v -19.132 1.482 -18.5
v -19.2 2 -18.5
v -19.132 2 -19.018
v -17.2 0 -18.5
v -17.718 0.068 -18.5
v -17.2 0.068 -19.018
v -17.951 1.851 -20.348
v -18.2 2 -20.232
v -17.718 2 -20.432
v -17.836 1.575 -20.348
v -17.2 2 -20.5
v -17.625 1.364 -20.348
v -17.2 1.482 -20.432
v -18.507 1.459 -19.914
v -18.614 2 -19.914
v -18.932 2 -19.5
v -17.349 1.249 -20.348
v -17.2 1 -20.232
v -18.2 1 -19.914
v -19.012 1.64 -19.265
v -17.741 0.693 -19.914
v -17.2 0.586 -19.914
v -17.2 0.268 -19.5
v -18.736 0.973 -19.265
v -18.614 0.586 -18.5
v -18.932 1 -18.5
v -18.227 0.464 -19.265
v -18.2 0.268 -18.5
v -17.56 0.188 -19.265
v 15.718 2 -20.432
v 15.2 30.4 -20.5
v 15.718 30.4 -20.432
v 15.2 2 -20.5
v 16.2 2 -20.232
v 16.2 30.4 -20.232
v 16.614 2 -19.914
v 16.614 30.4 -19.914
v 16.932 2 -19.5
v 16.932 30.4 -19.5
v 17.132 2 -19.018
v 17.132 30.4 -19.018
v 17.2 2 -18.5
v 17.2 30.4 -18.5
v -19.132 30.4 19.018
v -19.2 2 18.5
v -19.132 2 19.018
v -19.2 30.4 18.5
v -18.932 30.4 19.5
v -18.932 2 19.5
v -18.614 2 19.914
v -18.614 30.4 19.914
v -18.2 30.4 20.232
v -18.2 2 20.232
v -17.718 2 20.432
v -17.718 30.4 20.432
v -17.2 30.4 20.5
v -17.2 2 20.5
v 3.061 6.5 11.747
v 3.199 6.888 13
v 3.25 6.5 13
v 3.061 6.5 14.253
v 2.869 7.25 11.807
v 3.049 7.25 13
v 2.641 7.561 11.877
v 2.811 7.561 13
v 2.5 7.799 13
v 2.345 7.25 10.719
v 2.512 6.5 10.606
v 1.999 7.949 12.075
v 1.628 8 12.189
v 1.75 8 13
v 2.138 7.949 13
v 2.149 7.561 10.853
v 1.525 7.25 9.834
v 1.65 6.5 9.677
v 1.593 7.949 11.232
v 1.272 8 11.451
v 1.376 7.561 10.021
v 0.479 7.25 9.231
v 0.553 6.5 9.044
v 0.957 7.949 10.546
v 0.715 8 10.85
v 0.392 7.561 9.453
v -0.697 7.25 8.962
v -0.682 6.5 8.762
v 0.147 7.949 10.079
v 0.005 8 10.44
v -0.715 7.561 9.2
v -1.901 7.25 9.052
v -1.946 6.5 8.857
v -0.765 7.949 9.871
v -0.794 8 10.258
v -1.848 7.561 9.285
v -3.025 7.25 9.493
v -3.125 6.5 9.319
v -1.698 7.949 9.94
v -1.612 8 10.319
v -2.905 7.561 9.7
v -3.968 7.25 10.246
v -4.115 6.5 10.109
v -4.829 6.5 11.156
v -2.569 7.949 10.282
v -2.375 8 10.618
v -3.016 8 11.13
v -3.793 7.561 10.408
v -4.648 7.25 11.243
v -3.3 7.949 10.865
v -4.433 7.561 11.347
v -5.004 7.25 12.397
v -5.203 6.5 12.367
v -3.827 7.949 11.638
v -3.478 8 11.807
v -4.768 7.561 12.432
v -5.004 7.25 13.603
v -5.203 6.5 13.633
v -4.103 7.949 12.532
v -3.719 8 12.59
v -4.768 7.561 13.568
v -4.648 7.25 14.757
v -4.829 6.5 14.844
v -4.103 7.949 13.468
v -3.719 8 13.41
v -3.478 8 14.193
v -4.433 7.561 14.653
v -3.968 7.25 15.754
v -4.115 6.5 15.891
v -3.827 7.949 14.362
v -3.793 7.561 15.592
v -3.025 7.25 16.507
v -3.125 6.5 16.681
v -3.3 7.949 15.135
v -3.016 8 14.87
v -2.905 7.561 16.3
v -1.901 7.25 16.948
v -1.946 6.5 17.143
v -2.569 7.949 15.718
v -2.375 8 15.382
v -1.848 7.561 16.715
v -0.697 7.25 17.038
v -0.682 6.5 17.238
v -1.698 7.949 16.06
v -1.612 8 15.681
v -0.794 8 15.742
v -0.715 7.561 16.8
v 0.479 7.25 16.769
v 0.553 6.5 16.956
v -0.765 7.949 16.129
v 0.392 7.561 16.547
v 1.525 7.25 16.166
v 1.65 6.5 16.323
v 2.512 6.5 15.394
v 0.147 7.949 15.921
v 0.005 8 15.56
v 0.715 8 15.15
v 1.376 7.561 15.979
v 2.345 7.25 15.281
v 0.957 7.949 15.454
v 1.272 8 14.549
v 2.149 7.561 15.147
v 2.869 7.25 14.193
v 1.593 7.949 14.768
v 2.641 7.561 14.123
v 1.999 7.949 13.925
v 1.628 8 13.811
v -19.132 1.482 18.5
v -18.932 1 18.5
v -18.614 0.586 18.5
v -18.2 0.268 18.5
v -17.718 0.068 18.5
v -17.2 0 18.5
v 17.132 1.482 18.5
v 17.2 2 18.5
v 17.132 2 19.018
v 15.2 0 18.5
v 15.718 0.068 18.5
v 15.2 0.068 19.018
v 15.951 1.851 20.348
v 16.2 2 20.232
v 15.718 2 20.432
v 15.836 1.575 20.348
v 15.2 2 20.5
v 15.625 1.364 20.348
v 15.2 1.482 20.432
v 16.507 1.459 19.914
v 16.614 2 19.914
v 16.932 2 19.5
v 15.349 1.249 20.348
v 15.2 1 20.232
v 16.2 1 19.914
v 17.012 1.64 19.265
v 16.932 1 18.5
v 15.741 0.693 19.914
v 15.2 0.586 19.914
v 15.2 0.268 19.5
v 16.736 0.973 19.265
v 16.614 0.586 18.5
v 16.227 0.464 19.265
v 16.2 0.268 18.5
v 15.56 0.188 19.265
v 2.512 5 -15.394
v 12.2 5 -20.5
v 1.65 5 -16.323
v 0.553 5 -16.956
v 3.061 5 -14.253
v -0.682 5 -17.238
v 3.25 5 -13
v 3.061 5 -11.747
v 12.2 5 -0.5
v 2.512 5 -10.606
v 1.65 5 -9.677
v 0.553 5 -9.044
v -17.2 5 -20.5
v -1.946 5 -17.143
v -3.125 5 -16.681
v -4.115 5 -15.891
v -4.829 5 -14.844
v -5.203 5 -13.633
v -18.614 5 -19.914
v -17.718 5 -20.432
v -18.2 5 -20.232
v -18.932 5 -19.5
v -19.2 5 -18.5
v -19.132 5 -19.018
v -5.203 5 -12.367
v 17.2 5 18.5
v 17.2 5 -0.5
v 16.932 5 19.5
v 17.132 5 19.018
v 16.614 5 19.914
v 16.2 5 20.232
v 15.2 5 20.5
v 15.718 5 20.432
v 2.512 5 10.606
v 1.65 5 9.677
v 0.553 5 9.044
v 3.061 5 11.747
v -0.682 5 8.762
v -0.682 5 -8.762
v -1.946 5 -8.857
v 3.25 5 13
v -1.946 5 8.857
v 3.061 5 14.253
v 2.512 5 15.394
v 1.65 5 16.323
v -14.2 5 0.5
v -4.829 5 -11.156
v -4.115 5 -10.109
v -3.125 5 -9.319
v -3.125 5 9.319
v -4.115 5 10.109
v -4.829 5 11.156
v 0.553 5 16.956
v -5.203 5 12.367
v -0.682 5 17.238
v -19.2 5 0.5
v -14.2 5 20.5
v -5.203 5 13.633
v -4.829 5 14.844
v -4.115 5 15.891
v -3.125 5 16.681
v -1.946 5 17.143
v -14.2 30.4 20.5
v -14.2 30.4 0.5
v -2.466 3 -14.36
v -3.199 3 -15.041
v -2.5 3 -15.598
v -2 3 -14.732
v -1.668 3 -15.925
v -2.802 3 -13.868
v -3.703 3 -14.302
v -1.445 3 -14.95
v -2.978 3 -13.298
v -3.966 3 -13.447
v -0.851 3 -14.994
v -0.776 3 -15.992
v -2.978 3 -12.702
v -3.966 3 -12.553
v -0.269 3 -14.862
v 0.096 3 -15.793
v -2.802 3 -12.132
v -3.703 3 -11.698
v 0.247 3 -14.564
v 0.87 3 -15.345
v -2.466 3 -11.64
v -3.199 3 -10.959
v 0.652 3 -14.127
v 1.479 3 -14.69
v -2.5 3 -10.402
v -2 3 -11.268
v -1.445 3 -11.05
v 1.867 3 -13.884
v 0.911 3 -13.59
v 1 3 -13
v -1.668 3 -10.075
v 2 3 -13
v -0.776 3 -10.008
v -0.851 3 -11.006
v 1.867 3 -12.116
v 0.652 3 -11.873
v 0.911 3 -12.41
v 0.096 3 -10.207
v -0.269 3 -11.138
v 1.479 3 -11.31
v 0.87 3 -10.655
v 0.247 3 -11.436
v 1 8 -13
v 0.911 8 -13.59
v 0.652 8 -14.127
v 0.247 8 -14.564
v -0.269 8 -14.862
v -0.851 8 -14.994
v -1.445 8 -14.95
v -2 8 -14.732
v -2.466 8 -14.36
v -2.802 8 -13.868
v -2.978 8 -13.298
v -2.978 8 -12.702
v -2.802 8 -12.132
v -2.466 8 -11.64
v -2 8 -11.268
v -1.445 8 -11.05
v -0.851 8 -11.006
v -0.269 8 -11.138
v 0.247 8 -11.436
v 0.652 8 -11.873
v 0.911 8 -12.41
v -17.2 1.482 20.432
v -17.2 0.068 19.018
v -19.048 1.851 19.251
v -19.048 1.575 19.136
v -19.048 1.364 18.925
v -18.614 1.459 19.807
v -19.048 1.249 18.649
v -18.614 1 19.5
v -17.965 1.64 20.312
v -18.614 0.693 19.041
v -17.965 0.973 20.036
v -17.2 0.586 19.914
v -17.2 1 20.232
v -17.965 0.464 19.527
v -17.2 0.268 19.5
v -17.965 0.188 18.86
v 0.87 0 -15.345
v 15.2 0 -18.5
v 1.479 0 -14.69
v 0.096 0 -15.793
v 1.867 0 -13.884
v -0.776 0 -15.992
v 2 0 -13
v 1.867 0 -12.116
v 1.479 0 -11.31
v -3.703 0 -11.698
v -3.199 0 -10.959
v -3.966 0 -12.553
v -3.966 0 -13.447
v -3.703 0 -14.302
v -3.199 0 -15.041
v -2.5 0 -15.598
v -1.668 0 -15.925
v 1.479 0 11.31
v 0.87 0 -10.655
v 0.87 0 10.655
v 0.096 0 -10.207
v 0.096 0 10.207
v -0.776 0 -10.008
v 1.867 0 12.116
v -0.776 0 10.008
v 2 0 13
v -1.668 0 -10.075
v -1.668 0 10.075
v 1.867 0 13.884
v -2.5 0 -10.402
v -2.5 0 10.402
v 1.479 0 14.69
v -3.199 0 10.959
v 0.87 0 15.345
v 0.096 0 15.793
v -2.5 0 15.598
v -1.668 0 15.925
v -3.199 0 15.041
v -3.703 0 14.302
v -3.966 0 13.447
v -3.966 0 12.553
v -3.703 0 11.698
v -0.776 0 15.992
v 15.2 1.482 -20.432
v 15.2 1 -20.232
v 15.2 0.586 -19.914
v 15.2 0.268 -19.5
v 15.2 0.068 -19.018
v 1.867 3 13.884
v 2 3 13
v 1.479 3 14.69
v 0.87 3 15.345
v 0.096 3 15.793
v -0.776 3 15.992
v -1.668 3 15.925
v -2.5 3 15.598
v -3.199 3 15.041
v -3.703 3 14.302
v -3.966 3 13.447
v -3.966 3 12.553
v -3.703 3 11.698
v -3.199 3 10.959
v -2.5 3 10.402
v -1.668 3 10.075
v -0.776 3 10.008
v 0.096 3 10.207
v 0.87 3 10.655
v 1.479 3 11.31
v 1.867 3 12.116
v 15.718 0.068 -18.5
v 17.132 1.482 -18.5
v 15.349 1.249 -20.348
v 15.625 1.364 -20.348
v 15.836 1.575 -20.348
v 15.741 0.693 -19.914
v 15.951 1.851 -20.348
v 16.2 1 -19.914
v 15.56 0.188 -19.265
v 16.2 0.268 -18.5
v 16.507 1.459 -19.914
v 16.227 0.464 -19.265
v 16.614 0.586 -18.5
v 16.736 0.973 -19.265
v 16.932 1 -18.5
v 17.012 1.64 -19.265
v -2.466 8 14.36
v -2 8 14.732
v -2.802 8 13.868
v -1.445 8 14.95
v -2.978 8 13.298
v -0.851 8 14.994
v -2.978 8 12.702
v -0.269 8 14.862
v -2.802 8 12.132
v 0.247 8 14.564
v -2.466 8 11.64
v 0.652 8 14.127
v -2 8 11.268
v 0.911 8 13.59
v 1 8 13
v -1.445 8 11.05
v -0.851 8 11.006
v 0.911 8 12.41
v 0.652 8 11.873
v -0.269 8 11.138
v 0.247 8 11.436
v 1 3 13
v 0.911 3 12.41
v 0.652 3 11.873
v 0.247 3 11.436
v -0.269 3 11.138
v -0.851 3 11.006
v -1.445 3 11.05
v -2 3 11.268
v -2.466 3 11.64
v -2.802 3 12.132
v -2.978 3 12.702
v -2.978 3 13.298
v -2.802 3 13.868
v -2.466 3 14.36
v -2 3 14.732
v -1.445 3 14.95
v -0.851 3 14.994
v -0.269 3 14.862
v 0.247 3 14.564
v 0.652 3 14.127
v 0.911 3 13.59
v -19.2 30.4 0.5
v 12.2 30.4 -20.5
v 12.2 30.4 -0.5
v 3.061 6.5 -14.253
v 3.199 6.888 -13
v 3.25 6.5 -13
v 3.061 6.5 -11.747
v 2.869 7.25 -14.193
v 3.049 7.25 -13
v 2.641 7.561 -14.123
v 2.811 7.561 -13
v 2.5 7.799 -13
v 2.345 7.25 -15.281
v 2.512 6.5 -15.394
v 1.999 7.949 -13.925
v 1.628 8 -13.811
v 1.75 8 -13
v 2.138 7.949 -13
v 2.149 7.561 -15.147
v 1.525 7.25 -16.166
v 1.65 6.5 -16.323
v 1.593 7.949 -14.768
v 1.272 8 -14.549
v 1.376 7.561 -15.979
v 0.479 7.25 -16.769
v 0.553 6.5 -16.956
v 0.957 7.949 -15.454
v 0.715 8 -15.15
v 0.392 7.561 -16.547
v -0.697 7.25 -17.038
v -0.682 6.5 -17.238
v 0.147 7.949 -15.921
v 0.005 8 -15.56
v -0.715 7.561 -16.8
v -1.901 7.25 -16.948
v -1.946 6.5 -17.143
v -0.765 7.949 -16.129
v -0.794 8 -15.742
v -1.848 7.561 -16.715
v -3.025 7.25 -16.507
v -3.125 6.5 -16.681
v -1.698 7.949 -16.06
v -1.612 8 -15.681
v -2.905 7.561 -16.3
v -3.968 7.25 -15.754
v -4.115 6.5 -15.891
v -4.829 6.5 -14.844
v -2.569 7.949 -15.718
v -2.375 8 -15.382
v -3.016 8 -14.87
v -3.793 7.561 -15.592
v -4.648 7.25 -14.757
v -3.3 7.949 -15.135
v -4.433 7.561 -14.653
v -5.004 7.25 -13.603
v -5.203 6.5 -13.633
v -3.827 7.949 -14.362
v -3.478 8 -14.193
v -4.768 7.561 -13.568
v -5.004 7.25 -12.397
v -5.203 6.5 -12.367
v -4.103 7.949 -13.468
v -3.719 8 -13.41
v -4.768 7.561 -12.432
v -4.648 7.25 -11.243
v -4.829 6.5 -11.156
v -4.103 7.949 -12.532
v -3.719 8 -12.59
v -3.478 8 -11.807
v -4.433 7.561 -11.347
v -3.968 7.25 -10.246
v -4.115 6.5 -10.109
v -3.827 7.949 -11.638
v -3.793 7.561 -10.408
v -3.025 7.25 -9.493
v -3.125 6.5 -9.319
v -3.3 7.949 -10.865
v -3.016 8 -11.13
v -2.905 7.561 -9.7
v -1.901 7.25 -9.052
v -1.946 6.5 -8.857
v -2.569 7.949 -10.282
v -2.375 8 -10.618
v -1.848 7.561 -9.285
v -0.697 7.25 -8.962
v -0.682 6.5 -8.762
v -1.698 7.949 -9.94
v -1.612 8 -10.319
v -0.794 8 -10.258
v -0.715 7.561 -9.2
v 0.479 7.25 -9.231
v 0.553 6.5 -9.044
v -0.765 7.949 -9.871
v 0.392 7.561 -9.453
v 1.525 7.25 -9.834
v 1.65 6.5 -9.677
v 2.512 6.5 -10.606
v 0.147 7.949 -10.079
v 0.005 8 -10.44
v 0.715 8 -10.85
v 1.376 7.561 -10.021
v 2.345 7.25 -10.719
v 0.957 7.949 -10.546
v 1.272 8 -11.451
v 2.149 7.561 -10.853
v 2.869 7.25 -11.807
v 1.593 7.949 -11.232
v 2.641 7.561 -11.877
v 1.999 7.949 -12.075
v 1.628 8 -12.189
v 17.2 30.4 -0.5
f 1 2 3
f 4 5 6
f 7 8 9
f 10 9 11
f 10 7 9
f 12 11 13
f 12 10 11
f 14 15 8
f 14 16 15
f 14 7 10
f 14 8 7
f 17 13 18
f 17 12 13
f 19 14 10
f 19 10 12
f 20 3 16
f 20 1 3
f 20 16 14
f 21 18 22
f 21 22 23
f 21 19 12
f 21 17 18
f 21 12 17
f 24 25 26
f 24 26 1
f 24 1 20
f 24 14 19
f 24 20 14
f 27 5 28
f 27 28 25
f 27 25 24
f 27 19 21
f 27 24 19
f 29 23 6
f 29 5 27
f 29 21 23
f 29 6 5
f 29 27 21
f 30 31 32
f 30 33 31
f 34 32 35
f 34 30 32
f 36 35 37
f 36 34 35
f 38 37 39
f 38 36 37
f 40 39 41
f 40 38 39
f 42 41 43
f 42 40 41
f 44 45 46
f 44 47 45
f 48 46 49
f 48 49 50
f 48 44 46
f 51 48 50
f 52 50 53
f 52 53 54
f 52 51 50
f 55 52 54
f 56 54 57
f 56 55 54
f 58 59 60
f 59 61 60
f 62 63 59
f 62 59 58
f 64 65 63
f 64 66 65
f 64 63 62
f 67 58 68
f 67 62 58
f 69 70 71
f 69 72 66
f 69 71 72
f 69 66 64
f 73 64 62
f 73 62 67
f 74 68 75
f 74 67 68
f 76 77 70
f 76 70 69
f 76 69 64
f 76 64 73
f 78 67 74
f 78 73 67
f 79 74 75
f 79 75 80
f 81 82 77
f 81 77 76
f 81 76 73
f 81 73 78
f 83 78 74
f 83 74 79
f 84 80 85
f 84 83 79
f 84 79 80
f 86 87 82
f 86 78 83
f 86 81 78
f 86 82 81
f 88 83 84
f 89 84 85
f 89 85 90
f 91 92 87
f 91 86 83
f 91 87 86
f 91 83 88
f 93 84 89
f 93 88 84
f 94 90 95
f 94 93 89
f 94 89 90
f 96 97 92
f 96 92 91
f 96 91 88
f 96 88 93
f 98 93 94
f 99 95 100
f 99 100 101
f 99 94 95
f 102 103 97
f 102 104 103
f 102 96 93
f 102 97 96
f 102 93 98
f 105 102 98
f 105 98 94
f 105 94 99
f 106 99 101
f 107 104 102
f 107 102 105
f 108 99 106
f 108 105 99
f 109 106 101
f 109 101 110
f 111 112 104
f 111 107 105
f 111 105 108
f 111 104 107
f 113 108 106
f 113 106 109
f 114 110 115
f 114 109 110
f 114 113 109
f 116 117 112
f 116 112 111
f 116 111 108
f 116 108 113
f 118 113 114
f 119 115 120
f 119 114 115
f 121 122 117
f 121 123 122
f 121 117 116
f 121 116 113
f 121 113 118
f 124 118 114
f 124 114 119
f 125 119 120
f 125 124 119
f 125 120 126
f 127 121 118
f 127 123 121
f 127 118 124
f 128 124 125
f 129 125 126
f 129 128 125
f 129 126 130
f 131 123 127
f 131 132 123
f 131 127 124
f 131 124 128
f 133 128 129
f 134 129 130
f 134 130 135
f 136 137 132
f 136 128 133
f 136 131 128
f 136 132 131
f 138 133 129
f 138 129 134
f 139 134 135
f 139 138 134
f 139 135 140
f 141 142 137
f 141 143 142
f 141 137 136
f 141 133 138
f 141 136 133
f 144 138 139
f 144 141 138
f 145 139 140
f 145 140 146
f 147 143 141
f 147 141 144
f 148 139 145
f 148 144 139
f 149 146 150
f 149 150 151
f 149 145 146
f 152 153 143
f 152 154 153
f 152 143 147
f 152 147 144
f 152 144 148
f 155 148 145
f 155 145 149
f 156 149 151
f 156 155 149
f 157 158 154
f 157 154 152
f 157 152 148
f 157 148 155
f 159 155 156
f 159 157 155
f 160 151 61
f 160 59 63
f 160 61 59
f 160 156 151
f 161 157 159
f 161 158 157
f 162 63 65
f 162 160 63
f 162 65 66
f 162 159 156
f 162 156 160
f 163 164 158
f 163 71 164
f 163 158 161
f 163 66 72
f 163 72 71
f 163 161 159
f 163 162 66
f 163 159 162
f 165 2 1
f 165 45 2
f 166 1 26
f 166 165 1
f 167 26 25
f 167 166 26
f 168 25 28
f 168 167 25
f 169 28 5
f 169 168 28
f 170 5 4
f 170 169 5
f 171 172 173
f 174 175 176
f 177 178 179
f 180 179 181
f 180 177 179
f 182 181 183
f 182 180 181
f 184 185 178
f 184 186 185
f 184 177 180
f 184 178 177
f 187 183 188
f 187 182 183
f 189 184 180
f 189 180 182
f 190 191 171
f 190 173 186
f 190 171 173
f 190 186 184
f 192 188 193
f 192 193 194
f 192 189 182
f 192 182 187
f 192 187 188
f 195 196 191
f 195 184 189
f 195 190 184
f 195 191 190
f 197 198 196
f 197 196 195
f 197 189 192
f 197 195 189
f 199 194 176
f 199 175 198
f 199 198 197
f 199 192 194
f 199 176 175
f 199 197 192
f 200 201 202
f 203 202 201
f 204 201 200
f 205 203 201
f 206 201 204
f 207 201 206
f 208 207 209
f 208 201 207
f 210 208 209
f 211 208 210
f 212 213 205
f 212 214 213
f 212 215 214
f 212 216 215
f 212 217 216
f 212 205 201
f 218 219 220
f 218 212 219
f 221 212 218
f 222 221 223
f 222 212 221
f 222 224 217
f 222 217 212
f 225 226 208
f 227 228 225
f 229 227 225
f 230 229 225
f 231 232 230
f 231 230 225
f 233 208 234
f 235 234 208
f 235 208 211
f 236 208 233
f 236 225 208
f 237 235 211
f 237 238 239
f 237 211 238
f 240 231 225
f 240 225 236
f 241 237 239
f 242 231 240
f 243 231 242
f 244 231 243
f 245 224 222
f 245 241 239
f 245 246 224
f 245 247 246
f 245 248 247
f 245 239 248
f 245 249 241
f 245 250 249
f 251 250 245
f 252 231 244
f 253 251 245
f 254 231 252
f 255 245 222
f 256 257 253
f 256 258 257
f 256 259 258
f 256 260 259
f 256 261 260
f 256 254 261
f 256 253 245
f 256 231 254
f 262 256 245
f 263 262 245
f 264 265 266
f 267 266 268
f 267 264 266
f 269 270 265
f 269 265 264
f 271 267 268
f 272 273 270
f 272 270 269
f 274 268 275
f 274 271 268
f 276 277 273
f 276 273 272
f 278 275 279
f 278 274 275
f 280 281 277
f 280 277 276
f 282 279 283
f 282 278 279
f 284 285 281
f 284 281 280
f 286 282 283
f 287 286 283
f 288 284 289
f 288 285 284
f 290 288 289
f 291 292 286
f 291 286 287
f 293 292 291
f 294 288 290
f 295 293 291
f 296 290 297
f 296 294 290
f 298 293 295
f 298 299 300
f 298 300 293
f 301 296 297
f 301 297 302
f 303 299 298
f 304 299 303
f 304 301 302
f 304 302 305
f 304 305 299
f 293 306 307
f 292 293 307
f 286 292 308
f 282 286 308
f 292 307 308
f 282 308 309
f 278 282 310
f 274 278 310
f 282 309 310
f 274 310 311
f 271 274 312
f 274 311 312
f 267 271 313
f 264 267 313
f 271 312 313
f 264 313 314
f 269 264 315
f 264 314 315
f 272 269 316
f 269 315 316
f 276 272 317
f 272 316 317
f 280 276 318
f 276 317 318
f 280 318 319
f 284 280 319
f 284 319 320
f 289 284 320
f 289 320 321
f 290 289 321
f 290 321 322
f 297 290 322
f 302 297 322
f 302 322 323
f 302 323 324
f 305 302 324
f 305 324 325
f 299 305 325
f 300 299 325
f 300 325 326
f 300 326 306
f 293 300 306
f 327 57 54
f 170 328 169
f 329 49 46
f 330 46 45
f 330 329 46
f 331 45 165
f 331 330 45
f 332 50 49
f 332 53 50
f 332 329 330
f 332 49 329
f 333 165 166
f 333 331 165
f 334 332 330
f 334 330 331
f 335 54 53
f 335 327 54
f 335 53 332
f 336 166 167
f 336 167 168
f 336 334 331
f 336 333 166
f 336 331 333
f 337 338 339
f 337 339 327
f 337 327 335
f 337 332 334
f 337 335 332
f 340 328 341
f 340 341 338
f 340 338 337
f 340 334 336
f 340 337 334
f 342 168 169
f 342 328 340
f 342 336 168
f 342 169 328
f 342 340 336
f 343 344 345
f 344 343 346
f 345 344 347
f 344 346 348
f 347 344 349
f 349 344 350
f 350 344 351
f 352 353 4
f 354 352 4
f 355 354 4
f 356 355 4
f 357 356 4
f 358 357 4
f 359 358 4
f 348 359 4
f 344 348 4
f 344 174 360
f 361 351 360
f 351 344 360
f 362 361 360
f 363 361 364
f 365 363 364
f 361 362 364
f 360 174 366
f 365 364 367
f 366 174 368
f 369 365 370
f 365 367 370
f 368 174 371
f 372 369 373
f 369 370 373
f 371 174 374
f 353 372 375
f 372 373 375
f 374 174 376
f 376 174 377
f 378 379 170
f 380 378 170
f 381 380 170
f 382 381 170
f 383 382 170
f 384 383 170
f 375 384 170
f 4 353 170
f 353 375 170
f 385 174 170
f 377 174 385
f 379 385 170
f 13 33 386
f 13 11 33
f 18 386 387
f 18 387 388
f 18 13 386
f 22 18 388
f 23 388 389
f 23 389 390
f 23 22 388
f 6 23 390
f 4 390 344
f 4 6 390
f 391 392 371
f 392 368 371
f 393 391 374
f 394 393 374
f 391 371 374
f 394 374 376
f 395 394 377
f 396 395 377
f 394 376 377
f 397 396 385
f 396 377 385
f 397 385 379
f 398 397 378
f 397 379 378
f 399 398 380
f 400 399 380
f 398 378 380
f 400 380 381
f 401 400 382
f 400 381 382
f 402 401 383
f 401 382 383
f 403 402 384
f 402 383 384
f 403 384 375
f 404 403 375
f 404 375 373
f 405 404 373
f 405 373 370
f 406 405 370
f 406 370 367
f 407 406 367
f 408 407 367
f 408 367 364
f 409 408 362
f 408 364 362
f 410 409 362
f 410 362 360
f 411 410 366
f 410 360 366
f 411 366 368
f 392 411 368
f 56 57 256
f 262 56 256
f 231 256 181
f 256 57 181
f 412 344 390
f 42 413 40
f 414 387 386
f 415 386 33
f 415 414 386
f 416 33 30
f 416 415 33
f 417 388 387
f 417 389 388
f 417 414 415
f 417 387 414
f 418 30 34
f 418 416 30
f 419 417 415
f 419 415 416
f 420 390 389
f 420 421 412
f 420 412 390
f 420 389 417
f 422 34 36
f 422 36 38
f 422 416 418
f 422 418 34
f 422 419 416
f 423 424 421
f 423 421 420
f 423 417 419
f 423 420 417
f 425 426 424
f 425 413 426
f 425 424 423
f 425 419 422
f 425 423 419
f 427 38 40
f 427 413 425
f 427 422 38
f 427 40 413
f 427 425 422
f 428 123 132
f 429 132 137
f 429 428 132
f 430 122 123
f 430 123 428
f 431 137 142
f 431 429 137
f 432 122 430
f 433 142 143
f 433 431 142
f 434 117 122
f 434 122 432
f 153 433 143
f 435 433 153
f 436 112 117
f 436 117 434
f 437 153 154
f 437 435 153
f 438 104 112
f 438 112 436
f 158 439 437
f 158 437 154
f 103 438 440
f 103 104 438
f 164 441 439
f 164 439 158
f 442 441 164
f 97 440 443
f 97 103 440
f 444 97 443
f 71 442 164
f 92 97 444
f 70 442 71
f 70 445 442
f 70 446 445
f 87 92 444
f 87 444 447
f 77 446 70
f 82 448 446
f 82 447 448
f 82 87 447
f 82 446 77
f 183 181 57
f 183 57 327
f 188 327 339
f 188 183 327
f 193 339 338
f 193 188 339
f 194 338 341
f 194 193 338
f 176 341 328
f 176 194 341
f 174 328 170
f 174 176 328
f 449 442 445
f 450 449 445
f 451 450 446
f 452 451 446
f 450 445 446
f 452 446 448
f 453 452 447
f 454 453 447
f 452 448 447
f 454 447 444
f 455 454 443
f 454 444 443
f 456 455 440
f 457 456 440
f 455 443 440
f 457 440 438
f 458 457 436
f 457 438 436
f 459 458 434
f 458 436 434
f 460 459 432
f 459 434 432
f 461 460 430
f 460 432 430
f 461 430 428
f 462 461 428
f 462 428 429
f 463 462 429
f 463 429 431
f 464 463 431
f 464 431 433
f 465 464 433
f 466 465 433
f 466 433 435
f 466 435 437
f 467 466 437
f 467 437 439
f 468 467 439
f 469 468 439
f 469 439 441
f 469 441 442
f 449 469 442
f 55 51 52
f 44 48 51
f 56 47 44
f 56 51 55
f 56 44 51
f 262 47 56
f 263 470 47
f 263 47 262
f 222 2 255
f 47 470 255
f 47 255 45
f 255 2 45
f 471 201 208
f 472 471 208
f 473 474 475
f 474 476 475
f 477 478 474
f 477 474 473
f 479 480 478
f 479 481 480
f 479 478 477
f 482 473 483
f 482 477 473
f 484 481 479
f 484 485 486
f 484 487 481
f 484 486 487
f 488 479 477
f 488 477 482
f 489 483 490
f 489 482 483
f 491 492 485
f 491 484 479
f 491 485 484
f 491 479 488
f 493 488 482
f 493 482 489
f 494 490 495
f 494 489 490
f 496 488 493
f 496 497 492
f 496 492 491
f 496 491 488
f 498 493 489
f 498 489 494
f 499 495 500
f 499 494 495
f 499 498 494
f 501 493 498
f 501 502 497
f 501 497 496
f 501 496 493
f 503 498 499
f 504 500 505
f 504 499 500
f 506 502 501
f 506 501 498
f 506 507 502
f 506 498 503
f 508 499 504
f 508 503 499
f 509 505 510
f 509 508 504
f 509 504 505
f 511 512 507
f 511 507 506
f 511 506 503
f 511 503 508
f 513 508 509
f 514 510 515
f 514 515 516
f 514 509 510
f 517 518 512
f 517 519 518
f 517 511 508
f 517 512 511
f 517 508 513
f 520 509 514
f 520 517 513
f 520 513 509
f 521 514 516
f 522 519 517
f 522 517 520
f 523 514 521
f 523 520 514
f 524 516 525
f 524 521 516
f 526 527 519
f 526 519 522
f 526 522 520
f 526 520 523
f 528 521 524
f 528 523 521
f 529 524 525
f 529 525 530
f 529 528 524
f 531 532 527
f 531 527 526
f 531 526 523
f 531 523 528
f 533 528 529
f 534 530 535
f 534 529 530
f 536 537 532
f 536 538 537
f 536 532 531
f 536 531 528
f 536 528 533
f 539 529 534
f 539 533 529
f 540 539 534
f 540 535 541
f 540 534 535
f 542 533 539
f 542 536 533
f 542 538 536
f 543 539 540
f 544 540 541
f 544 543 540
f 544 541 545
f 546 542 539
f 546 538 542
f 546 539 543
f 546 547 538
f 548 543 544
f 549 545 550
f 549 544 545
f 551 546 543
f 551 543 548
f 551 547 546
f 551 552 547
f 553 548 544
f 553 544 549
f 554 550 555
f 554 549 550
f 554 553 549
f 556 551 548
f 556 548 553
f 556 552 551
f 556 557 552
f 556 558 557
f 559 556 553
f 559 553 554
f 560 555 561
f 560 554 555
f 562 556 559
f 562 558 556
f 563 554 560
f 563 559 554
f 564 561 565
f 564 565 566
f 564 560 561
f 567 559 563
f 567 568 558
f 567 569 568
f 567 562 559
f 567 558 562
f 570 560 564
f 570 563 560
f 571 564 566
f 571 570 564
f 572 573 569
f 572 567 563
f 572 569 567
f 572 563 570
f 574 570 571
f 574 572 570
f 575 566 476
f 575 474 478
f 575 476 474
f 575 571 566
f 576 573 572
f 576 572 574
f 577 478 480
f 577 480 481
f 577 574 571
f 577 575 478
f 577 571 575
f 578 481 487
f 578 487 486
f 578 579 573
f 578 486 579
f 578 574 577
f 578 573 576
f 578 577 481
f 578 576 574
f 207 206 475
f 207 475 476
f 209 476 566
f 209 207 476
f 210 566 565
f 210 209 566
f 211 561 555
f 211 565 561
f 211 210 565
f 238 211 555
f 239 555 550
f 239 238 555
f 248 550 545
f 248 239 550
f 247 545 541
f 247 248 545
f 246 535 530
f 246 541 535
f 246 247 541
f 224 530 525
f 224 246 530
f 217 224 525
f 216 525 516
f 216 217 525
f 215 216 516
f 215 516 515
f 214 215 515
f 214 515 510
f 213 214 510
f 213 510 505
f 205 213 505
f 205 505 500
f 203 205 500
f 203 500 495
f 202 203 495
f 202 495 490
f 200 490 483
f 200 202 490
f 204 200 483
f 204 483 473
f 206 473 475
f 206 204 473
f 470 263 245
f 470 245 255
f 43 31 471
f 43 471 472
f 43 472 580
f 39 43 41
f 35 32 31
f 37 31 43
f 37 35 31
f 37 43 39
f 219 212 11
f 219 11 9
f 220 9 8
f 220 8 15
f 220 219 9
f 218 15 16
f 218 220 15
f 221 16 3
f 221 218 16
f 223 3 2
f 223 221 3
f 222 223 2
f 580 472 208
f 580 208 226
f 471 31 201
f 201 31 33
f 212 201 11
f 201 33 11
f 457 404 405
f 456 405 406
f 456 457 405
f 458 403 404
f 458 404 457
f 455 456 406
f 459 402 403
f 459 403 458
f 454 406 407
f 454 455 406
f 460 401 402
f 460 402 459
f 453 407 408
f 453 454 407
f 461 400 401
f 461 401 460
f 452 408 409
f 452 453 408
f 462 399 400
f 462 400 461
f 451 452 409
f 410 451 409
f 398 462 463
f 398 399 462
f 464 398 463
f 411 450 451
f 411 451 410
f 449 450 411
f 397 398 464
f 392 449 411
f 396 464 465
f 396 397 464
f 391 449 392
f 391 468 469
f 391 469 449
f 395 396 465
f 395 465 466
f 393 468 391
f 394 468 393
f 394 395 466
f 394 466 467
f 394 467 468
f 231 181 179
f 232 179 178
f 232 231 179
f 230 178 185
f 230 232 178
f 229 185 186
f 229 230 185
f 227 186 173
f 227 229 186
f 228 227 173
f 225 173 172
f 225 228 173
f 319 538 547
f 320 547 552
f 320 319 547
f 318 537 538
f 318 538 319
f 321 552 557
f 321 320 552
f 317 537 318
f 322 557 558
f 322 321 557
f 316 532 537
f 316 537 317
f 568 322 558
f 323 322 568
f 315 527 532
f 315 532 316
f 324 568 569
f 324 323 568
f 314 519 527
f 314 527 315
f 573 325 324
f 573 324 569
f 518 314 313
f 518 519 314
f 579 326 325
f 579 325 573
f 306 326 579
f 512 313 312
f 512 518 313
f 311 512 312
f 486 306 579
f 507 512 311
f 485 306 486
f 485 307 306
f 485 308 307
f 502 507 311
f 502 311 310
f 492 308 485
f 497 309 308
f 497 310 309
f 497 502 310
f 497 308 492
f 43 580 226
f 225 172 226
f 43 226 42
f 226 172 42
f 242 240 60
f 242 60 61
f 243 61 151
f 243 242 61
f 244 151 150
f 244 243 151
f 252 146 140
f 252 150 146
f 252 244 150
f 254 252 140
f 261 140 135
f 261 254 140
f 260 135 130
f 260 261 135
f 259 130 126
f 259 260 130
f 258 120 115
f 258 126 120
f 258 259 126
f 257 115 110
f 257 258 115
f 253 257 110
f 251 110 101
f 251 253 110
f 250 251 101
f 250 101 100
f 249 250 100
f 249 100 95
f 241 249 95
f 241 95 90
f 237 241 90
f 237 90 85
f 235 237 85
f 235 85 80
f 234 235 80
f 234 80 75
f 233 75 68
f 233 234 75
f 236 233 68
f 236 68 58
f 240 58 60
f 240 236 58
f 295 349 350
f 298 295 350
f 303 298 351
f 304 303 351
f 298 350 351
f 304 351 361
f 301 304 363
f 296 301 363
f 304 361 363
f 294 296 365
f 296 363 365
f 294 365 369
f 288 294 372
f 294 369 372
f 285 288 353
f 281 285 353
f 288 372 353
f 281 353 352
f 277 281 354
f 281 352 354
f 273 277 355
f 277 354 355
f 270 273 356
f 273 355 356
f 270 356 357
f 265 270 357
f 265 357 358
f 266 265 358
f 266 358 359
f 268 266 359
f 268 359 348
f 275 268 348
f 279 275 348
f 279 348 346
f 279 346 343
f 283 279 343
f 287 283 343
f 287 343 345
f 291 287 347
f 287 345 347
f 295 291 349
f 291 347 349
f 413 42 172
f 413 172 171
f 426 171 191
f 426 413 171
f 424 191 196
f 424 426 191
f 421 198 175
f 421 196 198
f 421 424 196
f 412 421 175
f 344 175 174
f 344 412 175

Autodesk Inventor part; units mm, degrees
ref_plane "YZ Plane" through (0, 0, 0) normal (1, 0, 0) x (0, 1, 0)
ref_plane "XZ Plane" through (0, 0, 0) normal (0, 1, 0) x (-1, 0, 0)
ref_plane "XY Plane" through (0, 0, 0) normal (0, 0, 1) x (1, 0, 0)
sketch "Sketch1" plane through (0, 0, 0) normal (0, 1, 0) x (-1, 0, 0)
  line L0 (19.2, 20.5) -> (-17.2, 20.5)
  line L1 (-17.2, 20.5) -> (-17.2, -20.5)
  line L2 (-17.2, -20.5) -> (19.2, -20.5)
  line L3 (19.2, -20.5) -> (19.2, 20.5)
  point P0 (0, 0)
  dimension "d0" = 36.4
  dimension "d1" = 41
extrude "Extrusion1" add sketch "Sketch1" along normal blind 5
sketch "Sketch2" plane through (0, 5, 0) normal (0, 1, 0) x (1, 0, 0)
  line L0 (-19.2, -20.5) -> (17.2, -20.5) projected
  line L1 (-19.2, -20.5) -> (-14.2, -20.5)
  line L2 (-14.2, -20.5) -> (-14.2, -0.5)
  line L3 (-14.2, -0.5) -> (-19.2, -0.5)
  line L4 (-19.2, -0.5) -> (-19.2, -20.5)
  line L5 (17.2, 20.5) -> (-19.2, 20.5) projected
  line L6 (17.2, 20.5) -> (12.2, 20.5)
  line L7 (12.2, 20.5) -> (12.2, 0.5)
  line L8 (12.2, 0.5) -> (17.2, 0.5)
  line L9 (17.2, 0.5) -> (17.2, 20.5)
  point P0 (0, 0)
  dimension "d4" = 5
  dimension "d5" = 20
  dimension "d6" = 5
  dimension "d7" = 20
extrude "Extrusion2" add sketch "Sketch2" along normal blind 25.4
sketch "Sketch3" plane through (0, 5, 0) normal (0, 1, 0) x (1, 0, 0)
  circle A0 centre (-1, -13) radius 4.25
  circle A1 centre (-1, 13) radius 4.25
  line L0 (-14.2, -20.5) -> (-14.2, -0.5) projected
  line L1 (12.2, 20.5) -> (12.2, 0.5) projected
  point P0 (0, 0)
  dimension "d10" = 8.5
  dimension "d11" = 8.5
  dimension "d24" = 13.2
  dimension "d25" = 13.2
extrude "Extrusion3" add sketch "Sketch3" along normal blind 3
sketch "Sketch4" plane through (-1, 8, 13) normal (0, 1, 0) x (1, 0, 0)
  circle A0 centre (0, 0) radius 4.25 projected
  circle A1 centre (0, 0) radius 2
  circle A2 centre (0, 26) radius 4.25 projected
  circle A3 centre (0, 26) radius 2
  point P0 (1, 13)
  dimension "d14" = 4
  dimension "d15" = 4
extrude "Extrusion4" cut sketch "Sketch4" against normal blind 10 contours A1 | A3
fillet "Fillet1" radius 2 8 edges at (17.2, 0, 0) (-1, 0, 20.5) (-19.2, 0, 0) (-1, 0, -20.5) (-19.2, 15.2, 20.5) (17.2, 15.2, -20.5) (-19.2, 2.5, -20.5) (17.2, 2.5, 20.5)
fillet "Fillet2" radius 1.5 2 edges at (-5.25, 8, -13) (-5.25, 8, 13)
sketch "Sketch5" plane through (0, 0, 0) normal (0, -1, 0) x (1, 0, 0)
  circle A0 centre (-1, 13) radius 2 projected
  circle A1 centre (-1, 13) radius 3
  circle A2 centre (-1, -13) radius 2 projected
  circle A3 centre (-1, -13) radius 3
  point P0 (0, 0)
  dimension "d20" = 6
  dimension "d21" = 6
extrude "Extrusion5" cut sketch "Sketch5" against normal blind 3 contours A0 | A1 | A2 | A3
properties part number "botMountThick"
